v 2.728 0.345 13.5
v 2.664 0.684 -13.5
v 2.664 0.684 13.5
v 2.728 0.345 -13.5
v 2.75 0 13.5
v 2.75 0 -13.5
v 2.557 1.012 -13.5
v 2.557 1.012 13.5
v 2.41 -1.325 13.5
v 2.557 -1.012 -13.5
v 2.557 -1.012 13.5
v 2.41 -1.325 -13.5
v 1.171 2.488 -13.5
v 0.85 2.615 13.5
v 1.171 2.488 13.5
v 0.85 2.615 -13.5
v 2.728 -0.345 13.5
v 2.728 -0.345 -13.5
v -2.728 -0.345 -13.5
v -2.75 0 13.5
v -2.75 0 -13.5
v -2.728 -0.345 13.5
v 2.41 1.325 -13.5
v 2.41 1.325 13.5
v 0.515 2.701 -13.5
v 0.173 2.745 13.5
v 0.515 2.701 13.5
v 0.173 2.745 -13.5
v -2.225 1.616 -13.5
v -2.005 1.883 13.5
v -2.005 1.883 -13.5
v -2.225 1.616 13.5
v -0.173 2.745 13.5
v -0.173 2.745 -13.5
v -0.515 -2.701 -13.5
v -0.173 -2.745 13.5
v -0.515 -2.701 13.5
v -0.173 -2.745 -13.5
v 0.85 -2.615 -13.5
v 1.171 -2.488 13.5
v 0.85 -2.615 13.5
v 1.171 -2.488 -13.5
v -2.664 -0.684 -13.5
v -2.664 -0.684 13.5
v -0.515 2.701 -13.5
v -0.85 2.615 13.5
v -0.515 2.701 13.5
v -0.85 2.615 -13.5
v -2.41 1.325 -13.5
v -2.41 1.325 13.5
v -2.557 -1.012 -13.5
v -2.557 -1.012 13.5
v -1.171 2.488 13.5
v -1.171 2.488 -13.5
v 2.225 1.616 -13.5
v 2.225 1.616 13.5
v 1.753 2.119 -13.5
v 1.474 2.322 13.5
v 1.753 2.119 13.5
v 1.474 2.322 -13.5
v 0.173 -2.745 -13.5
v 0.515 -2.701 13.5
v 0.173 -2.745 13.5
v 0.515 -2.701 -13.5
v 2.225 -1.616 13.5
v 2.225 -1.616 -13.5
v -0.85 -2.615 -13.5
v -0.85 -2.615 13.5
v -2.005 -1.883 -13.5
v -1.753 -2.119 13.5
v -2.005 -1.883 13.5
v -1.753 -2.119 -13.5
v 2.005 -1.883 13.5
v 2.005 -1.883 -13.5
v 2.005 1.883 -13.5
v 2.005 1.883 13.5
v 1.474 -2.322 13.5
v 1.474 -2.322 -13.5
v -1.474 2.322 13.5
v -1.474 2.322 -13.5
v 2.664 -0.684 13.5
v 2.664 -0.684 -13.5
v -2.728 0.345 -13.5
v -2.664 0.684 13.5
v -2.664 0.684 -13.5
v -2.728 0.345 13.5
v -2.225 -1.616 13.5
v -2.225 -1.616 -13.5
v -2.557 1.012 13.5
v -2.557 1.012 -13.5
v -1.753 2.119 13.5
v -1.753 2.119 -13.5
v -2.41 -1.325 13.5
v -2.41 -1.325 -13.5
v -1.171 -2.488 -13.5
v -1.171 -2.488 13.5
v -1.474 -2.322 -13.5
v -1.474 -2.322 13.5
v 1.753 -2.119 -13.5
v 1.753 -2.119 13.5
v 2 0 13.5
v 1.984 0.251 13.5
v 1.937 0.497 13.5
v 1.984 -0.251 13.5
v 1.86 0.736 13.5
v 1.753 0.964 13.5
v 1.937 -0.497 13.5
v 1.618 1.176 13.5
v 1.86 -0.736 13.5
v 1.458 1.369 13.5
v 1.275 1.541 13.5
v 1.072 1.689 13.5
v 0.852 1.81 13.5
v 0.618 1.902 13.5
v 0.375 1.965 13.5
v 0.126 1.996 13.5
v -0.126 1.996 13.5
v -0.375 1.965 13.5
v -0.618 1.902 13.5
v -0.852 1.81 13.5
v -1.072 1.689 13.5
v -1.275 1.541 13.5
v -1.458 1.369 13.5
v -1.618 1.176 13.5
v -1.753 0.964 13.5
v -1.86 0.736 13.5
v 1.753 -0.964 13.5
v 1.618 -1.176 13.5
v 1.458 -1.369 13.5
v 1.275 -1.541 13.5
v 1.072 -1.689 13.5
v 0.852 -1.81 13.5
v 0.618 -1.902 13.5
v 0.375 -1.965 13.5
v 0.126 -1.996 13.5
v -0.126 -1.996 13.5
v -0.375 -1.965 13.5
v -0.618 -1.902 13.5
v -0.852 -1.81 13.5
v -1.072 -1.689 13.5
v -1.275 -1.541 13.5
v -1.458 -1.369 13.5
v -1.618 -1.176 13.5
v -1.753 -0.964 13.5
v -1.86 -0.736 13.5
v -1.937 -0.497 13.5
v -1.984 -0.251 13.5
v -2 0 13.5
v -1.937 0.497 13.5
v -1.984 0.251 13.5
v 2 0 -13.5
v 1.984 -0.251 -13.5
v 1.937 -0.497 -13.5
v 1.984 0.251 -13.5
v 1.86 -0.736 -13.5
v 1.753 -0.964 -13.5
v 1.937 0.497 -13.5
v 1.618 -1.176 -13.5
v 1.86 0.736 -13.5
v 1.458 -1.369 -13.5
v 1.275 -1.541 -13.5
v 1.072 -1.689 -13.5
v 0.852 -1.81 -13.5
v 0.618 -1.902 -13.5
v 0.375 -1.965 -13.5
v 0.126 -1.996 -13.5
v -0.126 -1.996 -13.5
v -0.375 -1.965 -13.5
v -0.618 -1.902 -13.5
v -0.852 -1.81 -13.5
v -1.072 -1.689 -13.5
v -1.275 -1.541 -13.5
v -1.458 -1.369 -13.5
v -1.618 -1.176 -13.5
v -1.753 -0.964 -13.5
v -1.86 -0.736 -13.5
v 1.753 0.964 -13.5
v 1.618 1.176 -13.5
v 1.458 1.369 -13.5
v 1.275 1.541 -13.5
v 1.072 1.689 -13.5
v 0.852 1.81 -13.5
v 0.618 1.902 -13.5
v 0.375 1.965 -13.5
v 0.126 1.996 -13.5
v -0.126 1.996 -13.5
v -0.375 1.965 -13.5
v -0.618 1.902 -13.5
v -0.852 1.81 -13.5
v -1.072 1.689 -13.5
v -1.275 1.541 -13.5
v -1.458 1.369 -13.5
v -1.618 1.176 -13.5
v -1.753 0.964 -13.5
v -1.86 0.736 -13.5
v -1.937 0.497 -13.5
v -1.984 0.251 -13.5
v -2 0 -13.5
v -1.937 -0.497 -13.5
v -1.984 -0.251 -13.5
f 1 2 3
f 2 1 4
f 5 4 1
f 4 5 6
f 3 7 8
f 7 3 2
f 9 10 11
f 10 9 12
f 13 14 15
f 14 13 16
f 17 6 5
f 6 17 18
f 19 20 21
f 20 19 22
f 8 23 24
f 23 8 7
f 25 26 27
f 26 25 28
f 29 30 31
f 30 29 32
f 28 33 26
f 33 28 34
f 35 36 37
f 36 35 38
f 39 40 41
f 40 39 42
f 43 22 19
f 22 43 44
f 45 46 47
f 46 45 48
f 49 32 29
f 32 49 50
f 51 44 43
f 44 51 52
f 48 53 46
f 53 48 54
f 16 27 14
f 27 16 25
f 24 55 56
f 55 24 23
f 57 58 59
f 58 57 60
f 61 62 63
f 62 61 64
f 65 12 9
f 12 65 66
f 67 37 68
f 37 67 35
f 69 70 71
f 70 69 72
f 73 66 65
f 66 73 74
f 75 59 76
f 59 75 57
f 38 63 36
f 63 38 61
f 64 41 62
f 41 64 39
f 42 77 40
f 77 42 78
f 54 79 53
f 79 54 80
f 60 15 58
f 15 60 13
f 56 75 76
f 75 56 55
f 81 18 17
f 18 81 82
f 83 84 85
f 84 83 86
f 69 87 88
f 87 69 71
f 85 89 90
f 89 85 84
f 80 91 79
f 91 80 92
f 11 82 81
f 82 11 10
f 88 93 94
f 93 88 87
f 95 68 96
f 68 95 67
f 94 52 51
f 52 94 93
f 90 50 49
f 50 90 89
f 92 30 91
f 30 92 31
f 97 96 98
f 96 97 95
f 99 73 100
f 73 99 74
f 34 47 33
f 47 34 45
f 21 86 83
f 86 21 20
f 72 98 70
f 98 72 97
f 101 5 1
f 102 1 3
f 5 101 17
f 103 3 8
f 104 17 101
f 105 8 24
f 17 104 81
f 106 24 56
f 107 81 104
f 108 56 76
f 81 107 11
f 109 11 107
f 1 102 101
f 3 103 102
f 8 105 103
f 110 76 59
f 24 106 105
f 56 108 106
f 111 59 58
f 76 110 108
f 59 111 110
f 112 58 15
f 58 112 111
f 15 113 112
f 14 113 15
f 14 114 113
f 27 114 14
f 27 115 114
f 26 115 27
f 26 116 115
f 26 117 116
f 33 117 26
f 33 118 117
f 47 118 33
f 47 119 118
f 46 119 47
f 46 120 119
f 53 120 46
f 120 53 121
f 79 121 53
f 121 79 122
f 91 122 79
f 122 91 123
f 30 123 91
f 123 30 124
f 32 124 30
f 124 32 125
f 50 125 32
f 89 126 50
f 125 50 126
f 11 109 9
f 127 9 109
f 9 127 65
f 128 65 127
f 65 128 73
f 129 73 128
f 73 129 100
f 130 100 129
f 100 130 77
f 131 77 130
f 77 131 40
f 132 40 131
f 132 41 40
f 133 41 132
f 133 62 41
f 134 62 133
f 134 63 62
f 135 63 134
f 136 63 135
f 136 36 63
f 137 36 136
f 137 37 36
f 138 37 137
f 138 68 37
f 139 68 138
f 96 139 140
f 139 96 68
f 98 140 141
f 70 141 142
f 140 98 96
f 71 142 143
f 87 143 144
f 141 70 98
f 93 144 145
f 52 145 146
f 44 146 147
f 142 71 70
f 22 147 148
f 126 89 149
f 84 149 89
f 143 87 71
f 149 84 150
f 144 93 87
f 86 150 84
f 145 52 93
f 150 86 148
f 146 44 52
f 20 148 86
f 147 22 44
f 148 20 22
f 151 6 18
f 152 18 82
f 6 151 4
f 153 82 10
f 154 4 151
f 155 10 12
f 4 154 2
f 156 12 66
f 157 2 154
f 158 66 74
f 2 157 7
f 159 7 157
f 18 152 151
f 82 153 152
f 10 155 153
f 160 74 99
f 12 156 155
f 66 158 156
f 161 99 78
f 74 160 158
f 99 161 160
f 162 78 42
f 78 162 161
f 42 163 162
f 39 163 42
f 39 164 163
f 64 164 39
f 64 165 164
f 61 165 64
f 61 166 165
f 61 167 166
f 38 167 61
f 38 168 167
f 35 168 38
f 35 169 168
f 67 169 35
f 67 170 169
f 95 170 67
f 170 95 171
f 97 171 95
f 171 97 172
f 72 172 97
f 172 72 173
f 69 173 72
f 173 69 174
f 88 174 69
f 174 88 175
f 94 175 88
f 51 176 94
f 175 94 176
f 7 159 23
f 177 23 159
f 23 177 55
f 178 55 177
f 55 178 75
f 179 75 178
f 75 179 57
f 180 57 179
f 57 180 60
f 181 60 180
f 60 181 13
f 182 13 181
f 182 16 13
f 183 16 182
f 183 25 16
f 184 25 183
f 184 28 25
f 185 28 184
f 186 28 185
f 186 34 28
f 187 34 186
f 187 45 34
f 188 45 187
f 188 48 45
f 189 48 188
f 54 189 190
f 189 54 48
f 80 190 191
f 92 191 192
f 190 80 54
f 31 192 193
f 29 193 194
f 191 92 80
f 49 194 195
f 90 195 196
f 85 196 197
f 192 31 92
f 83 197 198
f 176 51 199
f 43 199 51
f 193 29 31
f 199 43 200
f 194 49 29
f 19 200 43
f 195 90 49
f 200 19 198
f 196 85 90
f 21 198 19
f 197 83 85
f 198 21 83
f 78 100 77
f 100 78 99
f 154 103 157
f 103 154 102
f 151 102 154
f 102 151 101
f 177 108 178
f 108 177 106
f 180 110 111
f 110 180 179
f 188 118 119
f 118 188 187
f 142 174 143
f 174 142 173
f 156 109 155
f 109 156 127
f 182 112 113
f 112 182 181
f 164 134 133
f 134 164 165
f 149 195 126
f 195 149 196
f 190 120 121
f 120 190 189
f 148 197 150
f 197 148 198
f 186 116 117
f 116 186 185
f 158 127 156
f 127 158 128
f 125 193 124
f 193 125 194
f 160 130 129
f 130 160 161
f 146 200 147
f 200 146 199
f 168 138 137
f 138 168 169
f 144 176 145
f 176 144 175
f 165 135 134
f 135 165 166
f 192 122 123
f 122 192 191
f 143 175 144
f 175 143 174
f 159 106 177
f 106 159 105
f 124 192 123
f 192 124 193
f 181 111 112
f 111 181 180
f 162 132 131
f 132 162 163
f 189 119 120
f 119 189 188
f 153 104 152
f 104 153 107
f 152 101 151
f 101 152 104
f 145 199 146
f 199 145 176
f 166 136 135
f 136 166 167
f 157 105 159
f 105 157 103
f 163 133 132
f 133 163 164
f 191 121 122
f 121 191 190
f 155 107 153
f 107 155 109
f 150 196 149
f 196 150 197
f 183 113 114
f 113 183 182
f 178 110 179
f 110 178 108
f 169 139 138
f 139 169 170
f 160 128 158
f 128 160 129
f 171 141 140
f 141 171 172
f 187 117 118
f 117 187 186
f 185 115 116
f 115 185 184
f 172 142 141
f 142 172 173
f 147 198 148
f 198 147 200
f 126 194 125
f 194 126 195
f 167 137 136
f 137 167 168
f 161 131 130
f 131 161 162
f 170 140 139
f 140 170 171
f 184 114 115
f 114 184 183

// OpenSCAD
$fn = 50;


difference() {
	union() {
		translate(v = [0, 0, -13.5000000000]) {
			cylinder(h = 27, r = 2.7500000000);
		}
	}
	union() {
		translate(v = [0, 0, -100.0000000000]) {
			cylinder(h = 200, r = 2.0000000000);
		}
	}
}
